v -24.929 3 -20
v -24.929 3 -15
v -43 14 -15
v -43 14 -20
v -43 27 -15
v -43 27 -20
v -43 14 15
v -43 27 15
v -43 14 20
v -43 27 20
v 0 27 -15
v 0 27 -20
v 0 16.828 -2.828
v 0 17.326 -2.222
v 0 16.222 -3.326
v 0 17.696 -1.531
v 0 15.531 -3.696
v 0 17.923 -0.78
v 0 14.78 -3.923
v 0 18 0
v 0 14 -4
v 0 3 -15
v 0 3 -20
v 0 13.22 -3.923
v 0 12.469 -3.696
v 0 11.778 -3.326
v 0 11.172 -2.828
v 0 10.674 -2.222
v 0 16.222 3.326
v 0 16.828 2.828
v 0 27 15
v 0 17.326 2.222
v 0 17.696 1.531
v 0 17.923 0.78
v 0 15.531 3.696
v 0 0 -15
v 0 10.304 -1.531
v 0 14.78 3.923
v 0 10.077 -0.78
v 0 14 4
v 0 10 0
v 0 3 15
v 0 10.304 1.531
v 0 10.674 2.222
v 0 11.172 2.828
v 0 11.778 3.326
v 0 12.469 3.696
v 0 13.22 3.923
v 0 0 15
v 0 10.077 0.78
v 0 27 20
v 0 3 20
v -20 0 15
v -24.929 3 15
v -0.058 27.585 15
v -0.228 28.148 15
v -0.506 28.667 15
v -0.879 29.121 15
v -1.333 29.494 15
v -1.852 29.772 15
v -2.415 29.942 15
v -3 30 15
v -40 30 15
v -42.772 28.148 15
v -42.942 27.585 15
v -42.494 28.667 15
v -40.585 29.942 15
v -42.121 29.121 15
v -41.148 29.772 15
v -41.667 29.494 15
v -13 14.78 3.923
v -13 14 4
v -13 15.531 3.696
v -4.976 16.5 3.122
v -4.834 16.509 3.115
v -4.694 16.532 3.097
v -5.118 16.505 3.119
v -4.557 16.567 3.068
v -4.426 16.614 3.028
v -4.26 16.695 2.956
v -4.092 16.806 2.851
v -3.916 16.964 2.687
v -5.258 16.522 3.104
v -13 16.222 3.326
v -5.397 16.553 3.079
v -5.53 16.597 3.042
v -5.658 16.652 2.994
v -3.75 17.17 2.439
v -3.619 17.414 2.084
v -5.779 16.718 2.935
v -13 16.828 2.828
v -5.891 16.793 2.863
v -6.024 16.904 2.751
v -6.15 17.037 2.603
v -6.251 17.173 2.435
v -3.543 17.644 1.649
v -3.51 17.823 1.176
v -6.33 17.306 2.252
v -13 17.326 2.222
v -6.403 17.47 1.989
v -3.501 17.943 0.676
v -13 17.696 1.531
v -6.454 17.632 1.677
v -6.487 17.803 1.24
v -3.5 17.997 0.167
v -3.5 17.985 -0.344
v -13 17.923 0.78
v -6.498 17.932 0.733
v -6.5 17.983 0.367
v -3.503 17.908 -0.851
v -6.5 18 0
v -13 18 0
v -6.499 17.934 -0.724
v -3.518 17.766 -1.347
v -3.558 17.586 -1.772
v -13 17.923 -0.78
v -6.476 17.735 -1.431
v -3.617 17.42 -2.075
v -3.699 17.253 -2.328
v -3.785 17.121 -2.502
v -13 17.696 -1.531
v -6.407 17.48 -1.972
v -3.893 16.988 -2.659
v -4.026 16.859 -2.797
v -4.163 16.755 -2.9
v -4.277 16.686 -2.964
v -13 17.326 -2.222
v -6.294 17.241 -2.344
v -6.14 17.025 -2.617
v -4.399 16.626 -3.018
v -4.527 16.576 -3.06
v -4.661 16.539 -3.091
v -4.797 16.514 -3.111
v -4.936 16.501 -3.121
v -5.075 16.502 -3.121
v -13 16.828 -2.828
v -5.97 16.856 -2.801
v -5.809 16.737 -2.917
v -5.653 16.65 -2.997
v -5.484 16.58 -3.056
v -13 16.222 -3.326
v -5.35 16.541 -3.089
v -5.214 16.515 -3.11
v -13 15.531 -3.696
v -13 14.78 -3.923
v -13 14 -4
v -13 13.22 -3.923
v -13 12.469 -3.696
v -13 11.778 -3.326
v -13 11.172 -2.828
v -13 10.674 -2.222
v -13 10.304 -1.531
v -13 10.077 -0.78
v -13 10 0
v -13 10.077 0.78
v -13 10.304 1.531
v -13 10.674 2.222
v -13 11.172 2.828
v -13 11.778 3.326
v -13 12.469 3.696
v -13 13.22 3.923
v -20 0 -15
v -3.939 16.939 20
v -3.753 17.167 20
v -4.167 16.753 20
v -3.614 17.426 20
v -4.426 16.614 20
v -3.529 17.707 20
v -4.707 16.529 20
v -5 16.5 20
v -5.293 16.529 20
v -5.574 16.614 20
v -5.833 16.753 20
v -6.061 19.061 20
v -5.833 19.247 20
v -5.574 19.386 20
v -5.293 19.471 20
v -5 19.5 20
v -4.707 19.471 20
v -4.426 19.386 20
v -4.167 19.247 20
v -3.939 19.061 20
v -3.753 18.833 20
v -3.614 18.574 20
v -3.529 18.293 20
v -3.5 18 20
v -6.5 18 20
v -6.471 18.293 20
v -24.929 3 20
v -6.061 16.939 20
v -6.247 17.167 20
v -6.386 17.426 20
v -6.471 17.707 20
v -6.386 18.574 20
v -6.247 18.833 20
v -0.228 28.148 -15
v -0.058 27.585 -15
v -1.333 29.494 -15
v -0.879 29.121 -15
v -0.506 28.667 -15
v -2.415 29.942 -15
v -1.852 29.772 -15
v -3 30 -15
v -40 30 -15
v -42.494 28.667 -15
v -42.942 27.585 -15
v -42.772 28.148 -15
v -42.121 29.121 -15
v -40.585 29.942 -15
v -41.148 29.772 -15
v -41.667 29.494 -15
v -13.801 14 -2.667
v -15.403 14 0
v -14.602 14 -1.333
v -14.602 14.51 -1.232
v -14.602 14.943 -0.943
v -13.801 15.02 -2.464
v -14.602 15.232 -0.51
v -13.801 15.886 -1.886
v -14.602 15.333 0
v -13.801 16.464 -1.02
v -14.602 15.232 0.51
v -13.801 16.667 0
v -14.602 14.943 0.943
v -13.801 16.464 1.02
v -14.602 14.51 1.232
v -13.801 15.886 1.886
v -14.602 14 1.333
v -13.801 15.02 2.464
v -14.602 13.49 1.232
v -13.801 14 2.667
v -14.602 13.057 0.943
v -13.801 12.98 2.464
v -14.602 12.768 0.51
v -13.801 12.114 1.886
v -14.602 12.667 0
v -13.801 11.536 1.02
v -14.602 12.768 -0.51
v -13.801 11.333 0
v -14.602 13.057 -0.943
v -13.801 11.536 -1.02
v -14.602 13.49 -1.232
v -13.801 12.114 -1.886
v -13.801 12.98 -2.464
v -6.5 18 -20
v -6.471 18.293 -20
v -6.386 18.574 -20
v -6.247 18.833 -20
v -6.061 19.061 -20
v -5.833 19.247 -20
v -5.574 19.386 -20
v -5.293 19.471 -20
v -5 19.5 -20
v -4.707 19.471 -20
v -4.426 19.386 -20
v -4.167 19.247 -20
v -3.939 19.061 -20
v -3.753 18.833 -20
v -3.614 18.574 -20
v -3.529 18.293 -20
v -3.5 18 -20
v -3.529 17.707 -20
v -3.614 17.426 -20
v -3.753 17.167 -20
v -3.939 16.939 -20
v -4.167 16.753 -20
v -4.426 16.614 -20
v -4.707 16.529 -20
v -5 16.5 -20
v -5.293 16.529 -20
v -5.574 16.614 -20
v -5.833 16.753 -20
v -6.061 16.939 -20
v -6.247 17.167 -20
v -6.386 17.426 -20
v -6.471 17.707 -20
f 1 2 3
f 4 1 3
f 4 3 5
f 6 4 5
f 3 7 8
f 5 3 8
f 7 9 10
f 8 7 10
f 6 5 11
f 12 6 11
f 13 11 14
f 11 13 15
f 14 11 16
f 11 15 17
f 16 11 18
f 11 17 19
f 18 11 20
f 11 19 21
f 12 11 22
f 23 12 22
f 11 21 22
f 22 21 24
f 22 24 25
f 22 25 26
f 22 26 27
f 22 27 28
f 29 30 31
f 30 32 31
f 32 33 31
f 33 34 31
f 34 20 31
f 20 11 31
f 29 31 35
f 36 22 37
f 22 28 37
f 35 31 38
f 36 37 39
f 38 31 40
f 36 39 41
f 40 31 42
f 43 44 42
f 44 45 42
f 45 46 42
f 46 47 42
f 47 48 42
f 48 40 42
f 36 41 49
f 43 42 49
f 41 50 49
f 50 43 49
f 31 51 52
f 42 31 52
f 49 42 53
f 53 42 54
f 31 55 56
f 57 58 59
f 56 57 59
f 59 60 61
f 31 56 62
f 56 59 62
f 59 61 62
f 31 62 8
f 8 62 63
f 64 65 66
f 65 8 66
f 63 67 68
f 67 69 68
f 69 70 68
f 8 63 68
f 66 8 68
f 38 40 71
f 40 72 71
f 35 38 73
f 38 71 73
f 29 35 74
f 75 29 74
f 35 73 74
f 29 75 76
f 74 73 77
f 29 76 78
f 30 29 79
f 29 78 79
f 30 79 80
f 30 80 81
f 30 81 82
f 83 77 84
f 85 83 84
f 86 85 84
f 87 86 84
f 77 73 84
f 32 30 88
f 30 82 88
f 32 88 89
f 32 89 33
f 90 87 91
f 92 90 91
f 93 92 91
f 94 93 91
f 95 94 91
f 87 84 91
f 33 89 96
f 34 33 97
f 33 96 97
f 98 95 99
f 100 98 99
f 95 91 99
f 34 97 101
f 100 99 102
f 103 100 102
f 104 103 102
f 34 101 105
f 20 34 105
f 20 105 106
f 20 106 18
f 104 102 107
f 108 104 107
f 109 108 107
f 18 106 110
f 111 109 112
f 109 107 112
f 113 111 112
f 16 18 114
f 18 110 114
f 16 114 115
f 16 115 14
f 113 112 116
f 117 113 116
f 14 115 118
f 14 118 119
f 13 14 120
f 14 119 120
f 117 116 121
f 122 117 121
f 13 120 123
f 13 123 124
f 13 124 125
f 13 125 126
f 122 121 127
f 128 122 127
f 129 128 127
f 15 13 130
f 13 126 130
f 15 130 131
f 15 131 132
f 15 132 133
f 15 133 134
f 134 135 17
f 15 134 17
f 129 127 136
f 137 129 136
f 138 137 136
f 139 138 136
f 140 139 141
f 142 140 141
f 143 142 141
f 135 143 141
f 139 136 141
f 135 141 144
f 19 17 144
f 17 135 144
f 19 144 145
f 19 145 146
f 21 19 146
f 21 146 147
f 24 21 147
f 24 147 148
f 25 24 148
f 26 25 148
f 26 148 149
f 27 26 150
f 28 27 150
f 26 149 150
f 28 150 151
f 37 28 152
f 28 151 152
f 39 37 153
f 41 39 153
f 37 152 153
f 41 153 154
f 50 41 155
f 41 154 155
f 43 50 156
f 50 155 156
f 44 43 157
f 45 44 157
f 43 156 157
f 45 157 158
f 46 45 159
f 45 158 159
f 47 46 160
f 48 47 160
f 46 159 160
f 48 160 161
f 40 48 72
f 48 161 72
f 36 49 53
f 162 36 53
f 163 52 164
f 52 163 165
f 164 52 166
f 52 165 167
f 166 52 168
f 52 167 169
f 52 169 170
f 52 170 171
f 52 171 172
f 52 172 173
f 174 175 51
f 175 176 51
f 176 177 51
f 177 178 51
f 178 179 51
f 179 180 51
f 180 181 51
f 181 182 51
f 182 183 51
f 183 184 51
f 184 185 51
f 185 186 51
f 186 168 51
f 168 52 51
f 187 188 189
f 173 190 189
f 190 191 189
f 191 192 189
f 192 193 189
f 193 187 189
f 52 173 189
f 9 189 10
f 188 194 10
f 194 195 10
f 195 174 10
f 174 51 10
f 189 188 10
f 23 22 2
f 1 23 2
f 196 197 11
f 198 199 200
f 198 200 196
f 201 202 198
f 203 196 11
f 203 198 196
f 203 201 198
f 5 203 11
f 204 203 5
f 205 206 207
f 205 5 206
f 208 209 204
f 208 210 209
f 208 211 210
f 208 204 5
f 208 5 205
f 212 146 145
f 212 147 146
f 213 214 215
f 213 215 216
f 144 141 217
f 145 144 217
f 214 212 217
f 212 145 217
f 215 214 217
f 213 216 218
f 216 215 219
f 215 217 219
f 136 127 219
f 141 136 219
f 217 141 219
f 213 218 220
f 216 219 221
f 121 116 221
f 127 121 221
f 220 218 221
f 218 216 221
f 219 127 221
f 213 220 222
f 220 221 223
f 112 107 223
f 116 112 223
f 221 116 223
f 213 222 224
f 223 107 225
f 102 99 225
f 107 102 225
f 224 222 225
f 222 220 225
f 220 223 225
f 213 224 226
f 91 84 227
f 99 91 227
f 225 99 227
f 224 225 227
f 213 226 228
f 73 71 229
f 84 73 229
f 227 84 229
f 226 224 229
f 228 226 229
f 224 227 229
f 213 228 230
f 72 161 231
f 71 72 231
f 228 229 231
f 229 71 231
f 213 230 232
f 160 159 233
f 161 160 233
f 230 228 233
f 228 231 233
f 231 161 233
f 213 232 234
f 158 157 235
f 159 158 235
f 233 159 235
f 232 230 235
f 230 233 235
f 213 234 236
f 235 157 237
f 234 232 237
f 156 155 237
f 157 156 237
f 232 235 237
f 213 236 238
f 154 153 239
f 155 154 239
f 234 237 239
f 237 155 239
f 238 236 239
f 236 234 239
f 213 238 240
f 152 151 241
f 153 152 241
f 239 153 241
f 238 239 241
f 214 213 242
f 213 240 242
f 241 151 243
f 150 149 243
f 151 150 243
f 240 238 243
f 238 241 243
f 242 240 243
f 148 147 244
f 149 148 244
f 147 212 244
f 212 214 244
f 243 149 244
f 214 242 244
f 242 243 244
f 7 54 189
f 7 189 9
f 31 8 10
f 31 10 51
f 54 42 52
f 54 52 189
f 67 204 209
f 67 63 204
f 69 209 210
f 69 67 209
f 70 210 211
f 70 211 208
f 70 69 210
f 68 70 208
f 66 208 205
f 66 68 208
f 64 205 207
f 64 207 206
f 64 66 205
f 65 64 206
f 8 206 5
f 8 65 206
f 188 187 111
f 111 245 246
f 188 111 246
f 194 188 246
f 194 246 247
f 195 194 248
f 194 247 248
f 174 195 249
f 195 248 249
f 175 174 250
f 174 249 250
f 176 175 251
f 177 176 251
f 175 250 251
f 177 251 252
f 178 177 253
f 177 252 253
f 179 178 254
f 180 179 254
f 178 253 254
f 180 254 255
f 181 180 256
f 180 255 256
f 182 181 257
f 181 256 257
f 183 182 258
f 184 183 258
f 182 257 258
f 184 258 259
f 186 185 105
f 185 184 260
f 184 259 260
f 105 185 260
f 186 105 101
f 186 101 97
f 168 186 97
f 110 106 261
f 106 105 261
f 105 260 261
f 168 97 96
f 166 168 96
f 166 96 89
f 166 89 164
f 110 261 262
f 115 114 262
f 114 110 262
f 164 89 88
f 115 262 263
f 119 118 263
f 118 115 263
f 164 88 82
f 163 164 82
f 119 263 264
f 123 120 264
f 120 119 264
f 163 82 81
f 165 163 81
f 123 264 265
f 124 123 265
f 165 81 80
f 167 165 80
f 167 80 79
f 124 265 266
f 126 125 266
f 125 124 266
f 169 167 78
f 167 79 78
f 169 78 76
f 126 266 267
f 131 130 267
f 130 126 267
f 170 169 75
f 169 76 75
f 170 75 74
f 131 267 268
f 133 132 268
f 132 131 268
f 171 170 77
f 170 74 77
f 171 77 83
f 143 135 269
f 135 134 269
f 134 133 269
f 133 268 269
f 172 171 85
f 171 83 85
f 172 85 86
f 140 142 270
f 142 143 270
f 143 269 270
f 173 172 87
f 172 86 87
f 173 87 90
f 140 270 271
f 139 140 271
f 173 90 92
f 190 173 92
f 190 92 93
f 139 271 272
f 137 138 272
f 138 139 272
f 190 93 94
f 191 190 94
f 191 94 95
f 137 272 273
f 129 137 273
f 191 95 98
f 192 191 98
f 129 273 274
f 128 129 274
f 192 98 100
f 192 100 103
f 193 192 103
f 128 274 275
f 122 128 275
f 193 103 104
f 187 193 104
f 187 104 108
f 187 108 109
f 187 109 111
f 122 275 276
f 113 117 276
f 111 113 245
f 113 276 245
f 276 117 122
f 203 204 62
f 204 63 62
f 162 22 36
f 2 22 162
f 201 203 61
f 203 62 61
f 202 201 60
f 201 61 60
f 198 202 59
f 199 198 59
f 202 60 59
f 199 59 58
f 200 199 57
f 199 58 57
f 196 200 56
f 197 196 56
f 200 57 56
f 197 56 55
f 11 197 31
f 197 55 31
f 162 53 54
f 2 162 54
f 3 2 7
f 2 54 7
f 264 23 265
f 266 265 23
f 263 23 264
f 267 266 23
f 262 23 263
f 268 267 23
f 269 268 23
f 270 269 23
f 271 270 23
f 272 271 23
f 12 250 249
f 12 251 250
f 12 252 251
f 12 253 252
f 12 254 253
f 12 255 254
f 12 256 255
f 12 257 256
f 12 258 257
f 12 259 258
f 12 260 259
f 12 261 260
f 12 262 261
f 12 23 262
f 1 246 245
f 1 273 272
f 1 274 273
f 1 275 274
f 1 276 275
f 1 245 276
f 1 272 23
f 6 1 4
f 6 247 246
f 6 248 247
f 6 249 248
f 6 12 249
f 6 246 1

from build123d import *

# Parameters (mm, degrees)
EXTRUDE_1_DEPTH        = 15
FILLET_1_R             = 3
EXTRUDE_2_DEPTH        = 5
EXTRUDE_2_DEPTH_BACK   = 35
HOLE_WIZARD_M4_1_D     = 3
HOLE_WIZARD_M4_2_D     = 8
HOLE_WIZARD_M4_2_DEPTH = 13
HOLE_WIZARD_M4_2_TIP   = 2.403442476


with BuildPart() as part:
    # 스케치1 → 보스-돌출1 (new body, symmetric)
    with BuildSketch(Plane.XY):
        Polygon((0, 0), (-20, 0), (-43, 14), (-43, 30), (0, 30), align=None)
    extrude(amount=EXTRUDE_1_DEPTH, both=True)

    # 필렛1
    fillet_1_edges = [part.edges().sort_by_distance(p)[0] for p in [
        (-43, 30, 0),
        (0, 30, 0),
    ]]
    fillet(fillet_1_edges, radius=FILLET_1_R)

    # 스케치2 → 보스-돌출2 (add, two sides)
    with BuildSketch(Plane.XY.offset(15)) as extrude_2_sk:
        Polygon((-43, 27), (0, 27), (0, 3), (-24.928571429, 3), (-43, 14), align=None)
    extrude(amount=EXTRUDE_2_DEPTH)
    extrude(extrude_2_sk.sketch, amount=-EXTRUDE_2_DEPTH_BACK)

    # M4 여유 구멍1 (through all)
    with Locations(Plane.XY.offset(20)):
        with Locations((-5, 18)):
            Hole(HOLE_WIZARD_M4_1_D / 2)

    # M4 여유 구멍2
    with Locations(Plane(origin=(0, 0, 0), x_dir=(0, 0, -1), z_dir=(1, 0, 0))):
        with Locations((0, 14)):
            Hole(HOLE_WIZARD_M4_2_D / 2, depth=HOLE_WIZARD_M4_2_DEPTH)
            with Locations((0, 0, -(HOLE_WIZARD_M4_2_DEPTH + HOLE_WIZARD_M4_2_TIP / 2))):  # 118° drill point
                Cone(0, HOLE_WIZARD_M4_2_D / 2, HOLE_WIZARD_M4_2_TIP, mode=Mode.SUBTRACT)


solid = part.part
